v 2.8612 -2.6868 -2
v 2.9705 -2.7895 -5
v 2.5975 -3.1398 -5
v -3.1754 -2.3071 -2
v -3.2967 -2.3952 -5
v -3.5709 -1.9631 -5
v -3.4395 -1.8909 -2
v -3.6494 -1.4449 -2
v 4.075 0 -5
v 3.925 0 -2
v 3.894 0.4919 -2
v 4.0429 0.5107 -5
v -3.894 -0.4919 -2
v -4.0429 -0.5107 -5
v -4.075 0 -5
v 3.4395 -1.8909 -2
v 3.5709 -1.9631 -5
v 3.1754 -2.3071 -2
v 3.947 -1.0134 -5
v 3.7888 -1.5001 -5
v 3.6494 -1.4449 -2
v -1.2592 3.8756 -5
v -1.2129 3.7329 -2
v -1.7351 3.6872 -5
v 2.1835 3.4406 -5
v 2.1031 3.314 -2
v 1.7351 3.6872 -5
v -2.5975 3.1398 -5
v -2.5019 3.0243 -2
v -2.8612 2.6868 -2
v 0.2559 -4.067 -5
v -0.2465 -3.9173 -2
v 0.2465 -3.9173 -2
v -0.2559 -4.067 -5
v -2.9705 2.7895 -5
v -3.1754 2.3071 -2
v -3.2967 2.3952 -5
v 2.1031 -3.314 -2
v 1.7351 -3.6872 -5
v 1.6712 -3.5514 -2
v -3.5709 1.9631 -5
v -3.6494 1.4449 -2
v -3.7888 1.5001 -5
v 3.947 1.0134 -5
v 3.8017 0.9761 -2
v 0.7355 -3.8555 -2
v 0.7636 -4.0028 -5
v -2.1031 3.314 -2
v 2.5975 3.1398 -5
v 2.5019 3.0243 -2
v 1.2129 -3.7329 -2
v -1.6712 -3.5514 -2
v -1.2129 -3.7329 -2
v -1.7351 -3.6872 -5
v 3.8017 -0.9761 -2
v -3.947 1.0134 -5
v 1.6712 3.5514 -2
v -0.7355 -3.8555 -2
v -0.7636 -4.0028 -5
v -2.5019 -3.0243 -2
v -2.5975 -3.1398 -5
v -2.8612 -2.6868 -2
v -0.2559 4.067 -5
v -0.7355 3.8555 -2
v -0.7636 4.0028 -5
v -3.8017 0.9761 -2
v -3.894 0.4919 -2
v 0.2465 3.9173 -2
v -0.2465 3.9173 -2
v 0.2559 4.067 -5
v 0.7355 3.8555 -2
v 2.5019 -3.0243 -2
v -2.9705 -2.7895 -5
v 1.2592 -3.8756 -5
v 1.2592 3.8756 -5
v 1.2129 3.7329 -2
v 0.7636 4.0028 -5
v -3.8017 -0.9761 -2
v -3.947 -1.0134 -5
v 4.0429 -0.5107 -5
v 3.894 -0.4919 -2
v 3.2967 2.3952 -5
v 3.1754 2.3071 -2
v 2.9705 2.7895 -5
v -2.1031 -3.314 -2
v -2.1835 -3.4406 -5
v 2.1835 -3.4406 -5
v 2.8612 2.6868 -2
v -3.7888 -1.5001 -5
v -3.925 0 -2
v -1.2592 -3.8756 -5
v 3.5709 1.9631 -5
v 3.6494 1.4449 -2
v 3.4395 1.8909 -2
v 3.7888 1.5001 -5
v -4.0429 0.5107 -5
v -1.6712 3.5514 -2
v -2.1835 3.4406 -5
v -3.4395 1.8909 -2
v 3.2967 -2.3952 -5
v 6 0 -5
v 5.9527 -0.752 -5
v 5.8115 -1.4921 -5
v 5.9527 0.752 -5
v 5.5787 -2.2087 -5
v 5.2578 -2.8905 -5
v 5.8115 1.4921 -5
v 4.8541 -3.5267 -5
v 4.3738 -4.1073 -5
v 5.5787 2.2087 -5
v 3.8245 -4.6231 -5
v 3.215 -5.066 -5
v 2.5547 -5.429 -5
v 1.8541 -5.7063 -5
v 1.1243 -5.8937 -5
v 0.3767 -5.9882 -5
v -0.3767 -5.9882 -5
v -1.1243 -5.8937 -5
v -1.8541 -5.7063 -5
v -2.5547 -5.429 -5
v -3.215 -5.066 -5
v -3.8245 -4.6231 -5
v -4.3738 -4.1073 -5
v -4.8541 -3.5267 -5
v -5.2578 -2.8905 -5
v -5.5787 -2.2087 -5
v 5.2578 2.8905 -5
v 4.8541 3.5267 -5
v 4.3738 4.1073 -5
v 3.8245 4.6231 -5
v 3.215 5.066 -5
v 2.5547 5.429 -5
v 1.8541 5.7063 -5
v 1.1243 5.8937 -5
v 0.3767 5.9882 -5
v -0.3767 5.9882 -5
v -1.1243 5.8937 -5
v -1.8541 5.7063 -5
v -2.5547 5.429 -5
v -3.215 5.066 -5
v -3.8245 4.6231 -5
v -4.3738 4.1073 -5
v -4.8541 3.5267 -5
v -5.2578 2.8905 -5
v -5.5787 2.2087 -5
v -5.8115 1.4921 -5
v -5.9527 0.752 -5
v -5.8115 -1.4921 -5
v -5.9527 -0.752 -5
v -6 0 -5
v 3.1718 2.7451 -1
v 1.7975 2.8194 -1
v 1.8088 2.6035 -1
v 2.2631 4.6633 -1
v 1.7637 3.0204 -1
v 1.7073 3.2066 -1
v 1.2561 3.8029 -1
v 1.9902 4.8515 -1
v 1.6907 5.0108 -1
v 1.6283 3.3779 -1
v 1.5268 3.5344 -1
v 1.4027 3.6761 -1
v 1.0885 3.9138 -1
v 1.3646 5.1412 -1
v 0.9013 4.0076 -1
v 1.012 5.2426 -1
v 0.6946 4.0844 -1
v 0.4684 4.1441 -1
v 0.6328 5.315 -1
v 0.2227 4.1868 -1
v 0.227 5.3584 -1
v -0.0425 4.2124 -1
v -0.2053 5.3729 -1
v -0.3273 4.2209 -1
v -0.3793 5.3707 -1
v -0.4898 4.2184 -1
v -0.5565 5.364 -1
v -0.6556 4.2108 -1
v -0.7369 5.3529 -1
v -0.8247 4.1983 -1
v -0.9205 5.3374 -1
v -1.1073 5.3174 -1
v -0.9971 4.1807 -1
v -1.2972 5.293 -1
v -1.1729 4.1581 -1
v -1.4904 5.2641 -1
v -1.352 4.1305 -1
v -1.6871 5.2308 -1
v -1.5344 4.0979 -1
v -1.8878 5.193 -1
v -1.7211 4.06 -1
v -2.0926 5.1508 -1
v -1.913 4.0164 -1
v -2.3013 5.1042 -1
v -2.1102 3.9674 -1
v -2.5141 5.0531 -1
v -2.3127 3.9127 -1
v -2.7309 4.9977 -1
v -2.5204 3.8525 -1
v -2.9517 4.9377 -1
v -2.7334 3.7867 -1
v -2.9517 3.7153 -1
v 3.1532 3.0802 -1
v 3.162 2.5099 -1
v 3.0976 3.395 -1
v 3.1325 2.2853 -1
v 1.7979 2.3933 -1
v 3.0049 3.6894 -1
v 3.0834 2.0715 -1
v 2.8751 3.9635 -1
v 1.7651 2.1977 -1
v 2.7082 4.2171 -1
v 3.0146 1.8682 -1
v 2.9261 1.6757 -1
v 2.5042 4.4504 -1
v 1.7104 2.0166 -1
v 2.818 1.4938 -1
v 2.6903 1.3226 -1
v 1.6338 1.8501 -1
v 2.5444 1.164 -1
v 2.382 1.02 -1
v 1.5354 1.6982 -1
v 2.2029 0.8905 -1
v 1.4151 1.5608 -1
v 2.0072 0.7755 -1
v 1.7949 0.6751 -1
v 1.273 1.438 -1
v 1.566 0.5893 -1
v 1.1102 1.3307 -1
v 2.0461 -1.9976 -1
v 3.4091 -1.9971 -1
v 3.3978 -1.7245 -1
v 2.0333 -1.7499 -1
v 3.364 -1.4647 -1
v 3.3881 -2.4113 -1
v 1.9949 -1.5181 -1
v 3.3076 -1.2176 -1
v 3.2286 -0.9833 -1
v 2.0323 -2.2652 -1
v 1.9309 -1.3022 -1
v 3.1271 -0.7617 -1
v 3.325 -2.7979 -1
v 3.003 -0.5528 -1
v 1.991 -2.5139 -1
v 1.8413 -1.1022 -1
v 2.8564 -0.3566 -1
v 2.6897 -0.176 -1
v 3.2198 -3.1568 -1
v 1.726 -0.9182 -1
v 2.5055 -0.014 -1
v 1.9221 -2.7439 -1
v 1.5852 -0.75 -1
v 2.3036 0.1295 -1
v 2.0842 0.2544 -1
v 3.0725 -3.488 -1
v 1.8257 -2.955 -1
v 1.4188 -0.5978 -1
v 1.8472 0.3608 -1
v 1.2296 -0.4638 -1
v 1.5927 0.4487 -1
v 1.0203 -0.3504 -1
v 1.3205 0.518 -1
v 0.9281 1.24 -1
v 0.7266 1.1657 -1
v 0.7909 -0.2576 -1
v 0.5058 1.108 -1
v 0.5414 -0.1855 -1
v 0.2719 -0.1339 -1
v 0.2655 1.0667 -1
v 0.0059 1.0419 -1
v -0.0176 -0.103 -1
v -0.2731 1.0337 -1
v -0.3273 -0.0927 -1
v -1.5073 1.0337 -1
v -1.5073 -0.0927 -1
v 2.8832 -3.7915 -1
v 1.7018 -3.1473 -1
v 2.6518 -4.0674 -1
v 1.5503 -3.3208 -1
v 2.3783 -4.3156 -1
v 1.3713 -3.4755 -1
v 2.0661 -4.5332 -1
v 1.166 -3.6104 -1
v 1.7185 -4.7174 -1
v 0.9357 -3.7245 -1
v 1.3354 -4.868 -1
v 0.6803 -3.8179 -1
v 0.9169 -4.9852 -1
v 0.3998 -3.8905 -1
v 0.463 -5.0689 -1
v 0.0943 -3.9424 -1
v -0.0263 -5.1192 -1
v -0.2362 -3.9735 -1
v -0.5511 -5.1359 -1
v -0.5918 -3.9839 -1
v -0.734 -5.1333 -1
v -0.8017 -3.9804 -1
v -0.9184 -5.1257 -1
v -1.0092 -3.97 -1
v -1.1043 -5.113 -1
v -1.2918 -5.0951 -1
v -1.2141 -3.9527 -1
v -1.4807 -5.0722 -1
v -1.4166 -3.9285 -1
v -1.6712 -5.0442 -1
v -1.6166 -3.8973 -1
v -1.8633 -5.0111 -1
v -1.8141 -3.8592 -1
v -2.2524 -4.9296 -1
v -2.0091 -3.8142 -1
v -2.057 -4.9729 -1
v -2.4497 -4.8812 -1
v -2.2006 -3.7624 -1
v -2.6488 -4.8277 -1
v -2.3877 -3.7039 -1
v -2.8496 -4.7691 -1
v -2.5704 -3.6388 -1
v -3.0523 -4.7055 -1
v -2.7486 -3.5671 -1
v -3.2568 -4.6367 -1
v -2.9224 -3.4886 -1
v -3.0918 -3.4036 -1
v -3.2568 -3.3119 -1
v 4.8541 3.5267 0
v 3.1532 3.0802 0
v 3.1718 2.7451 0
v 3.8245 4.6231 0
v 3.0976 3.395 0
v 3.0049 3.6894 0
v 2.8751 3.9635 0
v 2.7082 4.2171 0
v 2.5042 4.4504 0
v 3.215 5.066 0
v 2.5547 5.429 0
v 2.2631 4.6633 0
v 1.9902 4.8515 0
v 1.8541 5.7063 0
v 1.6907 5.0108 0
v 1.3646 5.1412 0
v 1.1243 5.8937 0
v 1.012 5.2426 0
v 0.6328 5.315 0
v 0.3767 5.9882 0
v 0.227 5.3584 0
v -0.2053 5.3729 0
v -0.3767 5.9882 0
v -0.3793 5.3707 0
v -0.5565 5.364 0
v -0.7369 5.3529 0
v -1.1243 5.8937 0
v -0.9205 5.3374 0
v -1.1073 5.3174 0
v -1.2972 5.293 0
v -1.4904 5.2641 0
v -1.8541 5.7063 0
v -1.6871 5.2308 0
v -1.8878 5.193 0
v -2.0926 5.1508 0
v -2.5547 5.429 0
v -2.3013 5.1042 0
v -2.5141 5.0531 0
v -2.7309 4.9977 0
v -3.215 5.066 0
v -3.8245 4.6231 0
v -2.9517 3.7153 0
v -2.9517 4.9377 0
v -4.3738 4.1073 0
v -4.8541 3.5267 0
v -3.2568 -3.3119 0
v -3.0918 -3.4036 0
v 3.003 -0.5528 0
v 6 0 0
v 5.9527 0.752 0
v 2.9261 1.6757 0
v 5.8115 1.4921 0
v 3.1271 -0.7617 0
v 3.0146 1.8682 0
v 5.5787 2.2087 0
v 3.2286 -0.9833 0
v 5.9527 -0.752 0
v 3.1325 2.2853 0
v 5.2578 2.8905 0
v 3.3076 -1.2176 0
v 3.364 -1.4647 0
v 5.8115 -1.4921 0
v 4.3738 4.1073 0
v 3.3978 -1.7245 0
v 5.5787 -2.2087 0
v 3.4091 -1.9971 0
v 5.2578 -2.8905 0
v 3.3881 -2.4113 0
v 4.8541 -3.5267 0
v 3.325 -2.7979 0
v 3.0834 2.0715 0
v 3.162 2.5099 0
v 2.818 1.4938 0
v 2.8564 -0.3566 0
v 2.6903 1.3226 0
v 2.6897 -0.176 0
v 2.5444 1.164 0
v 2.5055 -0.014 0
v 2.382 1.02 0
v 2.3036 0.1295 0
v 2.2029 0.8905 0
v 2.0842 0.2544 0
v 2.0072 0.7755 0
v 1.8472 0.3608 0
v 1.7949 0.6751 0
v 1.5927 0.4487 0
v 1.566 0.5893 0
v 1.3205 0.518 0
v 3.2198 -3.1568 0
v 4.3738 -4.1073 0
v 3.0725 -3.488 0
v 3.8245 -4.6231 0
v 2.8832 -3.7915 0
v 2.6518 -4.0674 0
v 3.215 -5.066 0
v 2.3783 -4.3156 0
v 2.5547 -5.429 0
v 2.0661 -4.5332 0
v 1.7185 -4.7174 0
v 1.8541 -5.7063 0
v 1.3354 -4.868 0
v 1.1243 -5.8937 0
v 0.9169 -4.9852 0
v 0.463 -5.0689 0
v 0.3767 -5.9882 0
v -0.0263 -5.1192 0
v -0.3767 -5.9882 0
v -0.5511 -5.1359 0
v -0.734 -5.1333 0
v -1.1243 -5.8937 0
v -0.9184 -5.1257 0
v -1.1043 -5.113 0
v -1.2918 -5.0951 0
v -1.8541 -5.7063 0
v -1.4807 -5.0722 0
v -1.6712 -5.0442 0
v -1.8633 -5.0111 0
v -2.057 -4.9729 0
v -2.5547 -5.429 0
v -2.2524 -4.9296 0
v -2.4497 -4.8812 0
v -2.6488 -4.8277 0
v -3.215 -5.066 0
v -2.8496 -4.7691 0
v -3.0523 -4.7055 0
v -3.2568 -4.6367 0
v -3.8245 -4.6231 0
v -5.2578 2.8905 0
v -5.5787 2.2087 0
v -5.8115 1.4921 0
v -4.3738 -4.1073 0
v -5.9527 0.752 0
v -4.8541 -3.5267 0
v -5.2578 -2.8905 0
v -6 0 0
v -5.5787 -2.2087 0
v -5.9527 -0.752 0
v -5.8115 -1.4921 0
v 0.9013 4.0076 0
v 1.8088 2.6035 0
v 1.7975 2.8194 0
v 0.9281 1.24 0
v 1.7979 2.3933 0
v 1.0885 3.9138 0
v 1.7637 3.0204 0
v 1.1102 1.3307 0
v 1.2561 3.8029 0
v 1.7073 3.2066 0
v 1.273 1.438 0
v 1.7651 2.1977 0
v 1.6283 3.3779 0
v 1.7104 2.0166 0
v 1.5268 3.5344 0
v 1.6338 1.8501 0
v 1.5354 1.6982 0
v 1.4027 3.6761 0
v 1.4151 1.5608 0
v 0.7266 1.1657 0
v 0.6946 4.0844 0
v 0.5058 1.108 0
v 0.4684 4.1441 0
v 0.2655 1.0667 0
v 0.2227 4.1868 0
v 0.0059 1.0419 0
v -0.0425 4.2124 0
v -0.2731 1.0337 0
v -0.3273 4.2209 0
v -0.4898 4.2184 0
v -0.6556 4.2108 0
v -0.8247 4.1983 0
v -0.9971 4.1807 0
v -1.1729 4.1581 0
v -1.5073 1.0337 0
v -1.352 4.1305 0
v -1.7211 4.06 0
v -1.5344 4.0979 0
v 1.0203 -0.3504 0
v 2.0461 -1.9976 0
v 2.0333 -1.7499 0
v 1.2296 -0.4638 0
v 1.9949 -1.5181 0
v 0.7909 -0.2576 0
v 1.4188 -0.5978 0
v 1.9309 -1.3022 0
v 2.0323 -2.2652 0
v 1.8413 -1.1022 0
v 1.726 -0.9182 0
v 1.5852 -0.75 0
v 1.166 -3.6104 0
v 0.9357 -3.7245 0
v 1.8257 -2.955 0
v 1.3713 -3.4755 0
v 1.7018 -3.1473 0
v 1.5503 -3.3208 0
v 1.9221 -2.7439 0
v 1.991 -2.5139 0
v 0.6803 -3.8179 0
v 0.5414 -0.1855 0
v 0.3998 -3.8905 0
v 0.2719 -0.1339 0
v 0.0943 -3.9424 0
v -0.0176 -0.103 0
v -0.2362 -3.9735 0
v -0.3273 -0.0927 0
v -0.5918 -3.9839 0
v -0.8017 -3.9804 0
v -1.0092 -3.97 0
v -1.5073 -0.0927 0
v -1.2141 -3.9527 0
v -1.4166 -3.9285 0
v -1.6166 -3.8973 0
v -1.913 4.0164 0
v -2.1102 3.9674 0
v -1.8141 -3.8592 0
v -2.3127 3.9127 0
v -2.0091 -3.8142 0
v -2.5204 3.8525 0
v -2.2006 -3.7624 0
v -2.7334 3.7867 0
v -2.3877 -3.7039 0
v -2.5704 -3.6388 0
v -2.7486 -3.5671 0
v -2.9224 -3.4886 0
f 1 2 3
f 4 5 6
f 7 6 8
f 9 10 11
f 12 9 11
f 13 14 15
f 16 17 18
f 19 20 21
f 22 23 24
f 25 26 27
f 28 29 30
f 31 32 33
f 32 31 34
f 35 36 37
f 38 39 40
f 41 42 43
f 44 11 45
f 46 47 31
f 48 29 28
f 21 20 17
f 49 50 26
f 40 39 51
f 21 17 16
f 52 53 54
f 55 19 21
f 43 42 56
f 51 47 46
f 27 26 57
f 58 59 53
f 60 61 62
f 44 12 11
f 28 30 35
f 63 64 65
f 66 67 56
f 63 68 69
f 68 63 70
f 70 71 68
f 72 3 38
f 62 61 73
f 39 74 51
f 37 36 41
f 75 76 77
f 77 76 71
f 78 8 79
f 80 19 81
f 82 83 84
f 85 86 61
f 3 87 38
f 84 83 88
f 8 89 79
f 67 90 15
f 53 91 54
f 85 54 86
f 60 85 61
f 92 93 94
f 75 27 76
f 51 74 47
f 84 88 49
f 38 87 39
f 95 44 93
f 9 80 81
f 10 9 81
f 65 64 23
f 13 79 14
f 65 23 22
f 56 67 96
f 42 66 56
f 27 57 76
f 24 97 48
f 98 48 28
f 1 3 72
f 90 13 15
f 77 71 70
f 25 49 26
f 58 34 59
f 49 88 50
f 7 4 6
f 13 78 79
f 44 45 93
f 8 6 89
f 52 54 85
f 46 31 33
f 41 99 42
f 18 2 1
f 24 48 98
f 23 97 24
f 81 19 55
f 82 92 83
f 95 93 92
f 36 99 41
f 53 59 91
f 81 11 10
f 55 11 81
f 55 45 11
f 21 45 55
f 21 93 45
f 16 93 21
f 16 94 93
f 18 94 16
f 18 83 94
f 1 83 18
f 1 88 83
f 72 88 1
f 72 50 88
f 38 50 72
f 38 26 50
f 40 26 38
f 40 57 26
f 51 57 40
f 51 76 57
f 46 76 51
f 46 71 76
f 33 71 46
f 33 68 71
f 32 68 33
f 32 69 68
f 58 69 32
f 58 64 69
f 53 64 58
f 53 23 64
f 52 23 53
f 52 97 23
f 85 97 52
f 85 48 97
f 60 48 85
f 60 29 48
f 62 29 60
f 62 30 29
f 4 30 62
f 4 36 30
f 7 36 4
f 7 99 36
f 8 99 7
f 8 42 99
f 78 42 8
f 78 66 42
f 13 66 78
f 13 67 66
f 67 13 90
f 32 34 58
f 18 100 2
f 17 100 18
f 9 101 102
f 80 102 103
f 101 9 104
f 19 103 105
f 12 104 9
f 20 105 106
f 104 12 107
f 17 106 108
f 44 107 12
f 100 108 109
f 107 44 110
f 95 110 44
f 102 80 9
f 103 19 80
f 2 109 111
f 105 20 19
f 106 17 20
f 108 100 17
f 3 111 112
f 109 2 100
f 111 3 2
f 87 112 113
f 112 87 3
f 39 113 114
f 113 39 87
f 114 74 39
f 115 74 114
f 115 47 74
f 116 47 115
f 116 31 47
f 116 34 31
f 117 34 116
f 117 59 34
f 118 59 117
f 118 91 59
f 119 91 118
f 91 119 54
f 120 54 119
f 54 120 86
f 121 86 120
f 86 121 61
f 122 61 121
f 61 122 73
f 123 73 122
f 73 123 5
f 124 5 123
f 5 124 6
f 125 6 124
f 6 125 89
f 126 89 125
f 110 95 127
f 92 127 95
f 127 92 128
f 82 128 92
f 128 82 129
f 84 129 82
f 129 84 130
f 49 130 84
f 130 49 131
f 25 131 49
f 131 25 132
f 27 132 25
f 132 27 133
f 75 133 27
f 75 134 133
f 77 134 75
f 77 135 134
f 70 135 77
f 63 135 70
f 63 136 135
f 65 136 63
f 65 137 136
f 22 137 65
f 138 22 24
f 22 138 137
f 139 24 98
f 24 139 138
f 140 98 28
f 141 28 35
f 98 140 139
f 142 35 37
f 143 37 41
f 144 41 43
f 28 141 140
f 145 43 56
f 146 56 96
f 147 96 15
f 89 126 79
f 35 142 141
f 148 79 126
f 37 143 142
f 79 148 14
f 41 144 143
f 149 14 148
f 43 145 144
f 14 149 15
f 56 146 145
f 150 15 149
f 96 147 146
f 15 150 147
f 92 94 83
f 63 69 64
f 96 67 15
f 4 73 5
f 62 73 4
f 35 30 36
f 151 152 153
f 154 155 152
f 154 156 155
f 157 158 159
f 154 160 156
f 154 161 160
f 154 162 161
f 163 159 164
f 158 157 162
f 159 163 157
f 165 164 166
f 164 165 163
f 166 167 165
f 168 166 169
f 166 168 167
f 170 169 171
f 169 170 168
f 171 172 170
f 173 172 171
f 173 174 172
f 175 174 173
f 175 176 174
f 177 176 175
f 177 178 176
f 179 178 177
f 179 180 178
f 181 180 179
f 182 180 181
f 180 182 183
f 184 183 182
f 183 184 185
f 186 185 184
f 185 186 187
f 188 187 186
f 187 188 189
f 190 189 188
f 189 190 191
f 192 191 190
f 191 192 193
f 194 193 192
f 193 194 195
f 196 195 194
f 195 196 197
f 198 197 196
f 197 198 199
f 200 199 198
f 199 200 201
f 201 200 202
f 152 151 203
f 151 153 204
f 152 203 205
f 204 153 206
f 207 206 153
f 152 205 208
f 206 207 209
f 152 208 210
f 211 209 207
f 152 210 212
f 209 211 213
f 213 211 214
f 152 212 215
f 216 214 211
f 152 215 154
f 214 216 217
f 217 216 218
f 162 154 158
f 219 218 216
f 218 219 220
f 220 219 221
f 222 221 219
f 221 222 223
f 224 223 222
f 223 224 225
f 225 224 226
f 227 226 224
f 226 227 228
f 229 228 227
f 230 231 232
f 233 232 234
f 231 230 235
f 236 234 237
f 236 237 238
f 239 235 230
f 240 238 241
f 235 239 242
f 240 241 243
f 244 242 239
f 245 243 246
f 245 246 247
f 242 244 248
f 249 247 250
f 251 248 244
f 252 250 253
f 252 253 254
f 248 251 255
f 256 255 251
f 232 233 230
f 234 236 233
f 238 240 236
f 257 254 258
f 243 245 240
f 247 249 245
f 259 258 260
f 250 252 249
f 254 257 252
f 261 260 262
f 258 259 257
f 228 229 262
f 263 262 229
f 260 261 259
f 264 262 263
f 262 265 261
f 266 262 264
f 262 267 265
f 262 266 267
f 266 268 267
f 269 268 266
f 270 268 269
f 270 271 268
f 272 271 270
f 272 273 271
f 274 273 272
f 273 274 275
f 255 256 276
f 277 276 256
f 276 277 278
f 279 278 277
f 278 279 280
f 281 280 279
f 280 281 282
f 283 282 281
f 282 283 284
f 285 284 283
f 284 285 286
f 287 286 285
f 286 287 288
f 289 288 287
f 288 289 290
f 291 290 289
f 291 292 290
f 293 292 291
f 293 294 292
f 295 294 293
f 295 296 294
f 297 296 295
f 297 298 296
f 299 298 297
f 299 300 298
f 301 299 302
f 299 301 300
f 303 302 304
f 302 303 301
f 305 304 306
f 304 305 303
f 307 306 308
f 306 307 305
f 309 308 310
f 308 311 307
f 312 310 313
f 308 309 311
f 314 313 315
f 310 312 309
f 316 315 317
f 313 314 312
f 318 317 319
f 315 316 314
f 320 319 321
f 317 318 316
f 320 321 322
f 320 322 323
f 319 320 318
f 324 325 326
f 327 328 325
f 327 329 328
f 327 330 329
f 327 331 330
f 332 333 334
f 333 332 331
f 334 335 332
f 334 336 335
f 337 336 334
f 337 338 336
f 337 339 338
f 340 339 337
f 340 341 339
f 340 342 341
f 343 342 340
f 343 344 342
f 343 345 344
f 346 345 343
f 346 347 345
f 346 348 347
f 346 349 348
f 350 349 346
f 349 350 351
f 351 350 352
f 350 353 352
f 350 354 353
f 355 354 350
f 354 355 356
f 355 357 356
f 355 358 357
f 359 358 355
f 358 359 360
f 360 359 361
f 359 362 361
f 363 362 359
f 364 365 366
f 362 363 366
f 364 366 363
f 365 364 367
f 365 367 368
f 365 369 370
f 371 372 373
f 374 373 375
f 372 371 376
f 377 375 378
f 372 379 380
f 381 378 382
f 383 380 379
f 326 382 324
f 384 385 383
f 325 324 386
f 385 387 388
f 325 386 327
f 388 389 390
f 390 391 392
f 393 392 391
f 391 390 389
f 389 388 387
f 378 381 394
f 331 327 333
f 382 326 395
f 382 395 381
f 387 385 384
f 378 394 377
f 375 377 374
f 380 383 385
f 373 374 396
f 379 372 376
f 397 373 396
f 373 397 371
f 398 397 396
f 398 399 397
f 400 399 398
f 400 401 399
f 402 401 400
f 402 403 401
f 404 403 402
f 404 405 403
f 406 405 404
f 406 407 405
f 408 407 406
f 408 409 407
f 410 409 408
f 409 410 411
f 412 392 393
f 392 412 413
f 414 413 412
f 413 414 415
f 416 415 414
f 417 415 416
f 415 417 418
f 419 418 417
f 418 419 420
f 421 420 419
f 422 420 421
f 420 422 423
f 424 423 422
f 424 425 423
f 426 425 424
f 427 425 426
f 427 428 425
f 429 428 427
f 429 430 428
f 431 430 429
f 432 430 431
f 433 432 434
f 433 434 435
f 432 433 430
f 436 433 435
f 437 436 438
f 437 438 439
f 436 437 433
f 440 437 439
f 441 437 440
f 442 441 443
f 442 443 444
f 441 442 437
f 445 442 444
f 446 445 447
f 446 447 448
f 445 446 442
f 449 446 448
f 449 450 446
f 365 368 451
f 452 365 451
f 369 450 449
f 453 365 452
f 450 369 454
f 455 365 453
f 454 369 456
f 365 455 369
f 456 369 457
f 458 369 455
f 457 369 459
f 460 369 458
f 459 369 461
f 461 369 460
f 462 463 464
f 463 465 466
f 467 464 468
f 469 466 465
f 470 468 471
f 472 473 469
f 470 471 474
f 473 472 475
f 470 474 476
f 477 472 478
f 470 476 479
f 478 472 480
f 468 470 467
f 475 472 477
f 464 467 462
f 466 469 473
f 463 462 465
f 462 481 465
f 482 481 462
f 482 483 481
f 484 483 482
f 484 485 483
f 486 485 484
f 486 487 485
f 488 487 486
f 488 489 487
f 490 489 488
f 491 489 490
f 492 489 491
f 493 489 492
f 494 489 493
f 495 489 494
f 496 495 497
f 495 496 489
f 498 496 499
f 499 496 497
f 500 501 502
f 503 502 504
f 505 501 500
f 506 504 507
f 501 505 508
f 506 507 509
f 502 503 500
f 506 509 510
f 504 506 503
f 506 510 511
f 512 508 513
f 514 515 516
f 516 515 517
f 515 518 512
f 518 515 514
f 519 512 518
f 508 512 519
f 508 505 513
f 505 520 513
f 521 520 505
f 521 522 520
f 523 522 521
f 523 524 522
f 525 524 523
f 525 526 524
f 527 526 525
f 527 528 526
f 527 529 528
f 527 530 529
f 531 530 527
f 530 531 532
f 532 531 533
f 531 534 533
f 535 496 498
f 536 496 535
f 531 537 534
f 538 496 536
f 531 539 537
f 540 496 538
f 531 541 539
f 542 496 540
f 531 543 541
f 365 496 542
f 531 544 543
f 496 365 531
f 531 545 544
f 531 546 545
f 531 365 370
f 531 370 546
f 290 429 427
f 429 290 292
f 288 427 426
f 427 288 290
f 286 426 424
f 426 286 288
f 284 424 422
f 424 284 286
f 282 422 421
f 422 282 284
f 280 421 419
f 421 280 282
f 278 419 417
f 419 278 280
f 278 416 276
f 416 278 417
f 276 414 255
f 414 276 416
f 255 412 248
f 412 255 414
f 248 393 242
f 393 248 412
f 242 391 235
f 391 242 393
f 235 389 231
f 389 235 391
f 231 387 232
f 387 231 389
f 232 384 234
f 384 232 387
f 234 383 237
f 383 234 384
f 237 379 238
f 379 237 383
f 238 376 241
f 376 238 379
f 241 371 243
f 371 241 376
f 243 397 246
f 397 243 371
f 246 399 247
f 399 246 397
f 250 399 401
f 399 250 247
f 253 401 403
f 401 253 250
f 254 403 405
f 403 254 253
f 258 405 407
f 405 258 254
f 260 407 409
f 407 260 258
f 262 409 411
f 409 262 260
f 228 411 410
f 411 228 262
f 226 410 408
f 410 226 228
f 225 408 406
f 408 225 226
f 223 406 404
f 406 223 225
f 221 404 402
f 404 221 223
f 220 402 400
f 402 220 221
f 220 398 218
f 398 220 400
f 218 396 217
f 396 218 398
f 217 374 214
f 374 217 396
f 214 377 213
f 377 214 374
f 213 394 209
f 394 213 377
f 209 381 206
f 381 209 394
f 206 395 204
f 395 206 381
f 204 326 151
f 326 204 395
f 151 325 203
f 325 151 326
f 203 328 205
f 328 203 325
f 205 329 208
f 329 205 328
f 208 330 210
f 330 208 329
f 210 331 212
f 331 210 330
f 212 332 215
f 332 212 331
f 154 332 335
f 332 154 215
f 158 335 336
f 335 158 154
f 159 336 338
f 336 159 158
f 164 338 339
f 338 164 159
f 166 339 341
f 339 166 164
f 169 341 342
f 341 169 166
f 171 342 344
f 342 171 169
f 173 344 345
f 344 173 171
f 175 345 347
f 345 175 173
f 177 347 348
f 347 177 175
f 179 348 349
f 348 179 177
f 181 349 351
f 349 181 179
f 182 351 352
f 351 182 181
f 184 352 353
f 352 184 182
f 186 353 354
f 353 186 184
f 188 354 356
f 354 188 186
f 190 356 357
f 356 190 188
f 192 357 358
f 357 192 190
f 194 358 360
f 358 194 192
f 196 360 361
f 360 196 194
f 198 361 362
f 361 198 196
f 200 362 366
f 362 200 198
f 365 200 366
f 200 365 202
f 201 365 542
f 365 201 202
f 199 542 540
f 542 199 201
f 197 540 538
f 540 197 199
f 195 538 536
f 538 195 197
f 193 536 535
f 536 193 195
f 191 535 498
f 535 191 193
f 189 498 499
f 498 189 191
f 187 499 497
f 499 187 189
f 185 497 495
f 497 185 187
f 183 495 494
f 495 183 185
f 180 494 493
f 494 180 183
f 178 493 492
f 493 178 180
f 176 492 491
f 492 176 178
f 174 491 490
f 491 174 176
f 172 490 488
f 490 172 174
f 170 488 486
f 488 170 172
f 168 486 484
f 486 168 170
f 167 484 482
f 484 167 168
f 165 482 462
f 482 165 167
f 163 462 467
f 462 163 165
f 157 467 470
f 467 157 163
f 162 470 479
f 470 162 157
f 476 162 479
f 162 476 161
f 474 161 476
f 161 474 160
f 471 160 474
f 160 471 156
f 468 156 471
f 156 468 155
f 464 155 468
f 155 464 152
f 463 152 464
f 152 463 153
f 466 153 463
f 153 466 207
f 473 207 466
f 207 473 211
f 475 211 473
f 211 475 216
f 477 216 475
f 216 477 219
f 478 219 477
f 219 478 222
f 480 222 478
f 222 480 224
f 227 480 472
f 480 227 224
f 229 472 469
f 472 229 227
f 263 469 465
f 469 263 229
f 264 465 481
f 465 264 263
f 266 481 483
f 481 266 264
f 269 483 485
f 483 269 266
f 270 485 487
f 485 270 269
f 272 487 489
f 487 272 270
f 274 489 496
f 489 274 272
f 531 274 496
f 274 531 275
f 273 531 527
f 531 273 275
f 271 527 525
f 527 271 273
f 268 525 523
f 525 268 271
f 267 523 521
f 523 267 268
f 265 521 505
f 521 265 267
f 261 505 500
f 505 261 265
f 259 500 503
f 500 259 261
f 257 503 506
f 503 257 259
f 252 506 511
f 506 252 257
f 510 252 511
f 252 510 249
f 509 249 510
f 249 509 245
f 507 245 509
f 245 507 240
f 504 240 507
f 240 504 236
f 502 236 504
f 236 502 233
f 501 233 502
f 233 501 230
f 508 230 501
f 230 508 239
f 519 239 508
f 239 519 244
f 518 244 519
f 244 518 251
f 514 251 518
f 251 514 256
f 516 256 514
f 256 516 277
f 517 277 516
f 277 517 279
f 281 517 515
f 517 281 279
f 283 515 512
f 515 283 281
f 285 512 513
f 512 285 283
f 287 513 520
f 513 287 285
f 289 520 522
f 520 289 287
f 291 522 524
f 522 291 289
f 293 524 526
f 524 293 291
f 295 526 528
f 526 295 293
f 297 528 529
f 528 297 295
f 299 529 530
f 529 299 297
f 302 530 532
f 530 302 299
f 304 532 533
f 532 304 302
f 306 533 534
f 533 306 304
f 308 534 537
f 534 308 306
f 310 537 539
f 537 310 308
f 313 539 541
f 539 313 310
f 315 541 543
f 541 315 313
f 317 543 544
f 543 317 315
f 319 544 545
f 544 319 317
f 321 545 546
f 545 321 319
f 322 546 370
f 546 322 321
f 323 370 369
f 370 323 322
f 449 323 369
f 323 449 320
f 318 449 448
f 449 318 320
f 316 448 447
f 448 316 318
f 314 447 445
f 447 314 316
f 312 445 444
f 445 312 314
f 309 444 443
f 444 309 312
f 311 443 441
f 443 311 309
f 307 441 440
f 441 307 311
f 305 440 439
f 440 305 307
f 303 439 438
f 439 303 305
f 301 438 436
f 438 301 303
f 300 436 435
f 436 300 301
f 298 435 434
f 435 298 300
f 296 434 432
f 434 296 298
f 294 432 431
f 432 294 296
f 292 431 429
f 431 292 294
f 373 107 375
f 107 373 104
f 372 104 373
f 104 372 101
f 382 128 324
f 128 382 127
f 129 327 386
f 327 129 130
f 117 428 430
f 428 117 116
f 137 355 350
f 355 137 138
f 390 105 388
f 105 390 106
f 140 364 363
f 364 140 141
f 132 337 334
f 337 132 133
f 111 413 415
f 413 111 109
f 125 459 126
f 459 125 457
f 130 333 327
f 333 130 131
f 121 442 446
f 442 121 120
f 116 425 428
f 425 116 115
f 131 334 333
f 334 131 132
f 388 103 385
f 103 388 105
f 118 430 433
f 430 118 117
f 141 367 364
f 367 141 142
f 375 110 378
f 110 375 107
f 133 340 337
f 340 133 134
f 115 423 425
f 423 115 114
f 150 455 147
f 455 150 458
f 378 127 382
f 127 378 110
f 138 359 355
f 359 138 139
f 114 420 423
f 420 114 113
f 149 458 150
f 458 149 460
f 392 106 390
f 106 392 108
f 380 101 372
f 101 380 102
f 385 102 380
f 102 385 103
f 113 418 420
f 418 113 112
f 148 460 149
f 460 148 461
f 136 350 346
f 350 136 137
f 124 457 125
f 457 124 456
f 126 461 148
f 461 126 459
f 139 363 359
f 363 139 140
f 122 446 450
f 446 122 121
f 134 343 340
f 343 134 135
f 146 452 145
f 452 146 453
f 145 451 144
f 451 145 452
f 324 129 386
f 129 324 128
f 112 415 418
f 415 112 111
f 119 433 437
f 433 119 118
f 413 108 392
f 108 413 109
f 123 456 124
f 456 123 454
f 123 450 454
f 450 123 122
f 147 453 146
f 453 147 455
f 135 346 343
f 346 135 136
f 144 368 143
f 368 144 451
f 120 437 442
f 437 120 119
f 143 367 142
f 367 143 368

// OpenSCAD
$fn = 50;

difference() {
	union() {
		translate(v = [0, 0, -5.0]) {
			cylinder(h = 5, r = 6.0);
		}
	}
	union() {
		#translate(v = [0, 0, -5.0]) {
			cylinder(h = 3, r1 = 4.075, r2 = 3.925);
		}
		translate(v = [0, 0, -1]) {
			linear_extrude(height = 1) {
				text(font = "Impact", halign = "center", size = 10, text = "3", valign = "center");
			}
		}
	}
}
